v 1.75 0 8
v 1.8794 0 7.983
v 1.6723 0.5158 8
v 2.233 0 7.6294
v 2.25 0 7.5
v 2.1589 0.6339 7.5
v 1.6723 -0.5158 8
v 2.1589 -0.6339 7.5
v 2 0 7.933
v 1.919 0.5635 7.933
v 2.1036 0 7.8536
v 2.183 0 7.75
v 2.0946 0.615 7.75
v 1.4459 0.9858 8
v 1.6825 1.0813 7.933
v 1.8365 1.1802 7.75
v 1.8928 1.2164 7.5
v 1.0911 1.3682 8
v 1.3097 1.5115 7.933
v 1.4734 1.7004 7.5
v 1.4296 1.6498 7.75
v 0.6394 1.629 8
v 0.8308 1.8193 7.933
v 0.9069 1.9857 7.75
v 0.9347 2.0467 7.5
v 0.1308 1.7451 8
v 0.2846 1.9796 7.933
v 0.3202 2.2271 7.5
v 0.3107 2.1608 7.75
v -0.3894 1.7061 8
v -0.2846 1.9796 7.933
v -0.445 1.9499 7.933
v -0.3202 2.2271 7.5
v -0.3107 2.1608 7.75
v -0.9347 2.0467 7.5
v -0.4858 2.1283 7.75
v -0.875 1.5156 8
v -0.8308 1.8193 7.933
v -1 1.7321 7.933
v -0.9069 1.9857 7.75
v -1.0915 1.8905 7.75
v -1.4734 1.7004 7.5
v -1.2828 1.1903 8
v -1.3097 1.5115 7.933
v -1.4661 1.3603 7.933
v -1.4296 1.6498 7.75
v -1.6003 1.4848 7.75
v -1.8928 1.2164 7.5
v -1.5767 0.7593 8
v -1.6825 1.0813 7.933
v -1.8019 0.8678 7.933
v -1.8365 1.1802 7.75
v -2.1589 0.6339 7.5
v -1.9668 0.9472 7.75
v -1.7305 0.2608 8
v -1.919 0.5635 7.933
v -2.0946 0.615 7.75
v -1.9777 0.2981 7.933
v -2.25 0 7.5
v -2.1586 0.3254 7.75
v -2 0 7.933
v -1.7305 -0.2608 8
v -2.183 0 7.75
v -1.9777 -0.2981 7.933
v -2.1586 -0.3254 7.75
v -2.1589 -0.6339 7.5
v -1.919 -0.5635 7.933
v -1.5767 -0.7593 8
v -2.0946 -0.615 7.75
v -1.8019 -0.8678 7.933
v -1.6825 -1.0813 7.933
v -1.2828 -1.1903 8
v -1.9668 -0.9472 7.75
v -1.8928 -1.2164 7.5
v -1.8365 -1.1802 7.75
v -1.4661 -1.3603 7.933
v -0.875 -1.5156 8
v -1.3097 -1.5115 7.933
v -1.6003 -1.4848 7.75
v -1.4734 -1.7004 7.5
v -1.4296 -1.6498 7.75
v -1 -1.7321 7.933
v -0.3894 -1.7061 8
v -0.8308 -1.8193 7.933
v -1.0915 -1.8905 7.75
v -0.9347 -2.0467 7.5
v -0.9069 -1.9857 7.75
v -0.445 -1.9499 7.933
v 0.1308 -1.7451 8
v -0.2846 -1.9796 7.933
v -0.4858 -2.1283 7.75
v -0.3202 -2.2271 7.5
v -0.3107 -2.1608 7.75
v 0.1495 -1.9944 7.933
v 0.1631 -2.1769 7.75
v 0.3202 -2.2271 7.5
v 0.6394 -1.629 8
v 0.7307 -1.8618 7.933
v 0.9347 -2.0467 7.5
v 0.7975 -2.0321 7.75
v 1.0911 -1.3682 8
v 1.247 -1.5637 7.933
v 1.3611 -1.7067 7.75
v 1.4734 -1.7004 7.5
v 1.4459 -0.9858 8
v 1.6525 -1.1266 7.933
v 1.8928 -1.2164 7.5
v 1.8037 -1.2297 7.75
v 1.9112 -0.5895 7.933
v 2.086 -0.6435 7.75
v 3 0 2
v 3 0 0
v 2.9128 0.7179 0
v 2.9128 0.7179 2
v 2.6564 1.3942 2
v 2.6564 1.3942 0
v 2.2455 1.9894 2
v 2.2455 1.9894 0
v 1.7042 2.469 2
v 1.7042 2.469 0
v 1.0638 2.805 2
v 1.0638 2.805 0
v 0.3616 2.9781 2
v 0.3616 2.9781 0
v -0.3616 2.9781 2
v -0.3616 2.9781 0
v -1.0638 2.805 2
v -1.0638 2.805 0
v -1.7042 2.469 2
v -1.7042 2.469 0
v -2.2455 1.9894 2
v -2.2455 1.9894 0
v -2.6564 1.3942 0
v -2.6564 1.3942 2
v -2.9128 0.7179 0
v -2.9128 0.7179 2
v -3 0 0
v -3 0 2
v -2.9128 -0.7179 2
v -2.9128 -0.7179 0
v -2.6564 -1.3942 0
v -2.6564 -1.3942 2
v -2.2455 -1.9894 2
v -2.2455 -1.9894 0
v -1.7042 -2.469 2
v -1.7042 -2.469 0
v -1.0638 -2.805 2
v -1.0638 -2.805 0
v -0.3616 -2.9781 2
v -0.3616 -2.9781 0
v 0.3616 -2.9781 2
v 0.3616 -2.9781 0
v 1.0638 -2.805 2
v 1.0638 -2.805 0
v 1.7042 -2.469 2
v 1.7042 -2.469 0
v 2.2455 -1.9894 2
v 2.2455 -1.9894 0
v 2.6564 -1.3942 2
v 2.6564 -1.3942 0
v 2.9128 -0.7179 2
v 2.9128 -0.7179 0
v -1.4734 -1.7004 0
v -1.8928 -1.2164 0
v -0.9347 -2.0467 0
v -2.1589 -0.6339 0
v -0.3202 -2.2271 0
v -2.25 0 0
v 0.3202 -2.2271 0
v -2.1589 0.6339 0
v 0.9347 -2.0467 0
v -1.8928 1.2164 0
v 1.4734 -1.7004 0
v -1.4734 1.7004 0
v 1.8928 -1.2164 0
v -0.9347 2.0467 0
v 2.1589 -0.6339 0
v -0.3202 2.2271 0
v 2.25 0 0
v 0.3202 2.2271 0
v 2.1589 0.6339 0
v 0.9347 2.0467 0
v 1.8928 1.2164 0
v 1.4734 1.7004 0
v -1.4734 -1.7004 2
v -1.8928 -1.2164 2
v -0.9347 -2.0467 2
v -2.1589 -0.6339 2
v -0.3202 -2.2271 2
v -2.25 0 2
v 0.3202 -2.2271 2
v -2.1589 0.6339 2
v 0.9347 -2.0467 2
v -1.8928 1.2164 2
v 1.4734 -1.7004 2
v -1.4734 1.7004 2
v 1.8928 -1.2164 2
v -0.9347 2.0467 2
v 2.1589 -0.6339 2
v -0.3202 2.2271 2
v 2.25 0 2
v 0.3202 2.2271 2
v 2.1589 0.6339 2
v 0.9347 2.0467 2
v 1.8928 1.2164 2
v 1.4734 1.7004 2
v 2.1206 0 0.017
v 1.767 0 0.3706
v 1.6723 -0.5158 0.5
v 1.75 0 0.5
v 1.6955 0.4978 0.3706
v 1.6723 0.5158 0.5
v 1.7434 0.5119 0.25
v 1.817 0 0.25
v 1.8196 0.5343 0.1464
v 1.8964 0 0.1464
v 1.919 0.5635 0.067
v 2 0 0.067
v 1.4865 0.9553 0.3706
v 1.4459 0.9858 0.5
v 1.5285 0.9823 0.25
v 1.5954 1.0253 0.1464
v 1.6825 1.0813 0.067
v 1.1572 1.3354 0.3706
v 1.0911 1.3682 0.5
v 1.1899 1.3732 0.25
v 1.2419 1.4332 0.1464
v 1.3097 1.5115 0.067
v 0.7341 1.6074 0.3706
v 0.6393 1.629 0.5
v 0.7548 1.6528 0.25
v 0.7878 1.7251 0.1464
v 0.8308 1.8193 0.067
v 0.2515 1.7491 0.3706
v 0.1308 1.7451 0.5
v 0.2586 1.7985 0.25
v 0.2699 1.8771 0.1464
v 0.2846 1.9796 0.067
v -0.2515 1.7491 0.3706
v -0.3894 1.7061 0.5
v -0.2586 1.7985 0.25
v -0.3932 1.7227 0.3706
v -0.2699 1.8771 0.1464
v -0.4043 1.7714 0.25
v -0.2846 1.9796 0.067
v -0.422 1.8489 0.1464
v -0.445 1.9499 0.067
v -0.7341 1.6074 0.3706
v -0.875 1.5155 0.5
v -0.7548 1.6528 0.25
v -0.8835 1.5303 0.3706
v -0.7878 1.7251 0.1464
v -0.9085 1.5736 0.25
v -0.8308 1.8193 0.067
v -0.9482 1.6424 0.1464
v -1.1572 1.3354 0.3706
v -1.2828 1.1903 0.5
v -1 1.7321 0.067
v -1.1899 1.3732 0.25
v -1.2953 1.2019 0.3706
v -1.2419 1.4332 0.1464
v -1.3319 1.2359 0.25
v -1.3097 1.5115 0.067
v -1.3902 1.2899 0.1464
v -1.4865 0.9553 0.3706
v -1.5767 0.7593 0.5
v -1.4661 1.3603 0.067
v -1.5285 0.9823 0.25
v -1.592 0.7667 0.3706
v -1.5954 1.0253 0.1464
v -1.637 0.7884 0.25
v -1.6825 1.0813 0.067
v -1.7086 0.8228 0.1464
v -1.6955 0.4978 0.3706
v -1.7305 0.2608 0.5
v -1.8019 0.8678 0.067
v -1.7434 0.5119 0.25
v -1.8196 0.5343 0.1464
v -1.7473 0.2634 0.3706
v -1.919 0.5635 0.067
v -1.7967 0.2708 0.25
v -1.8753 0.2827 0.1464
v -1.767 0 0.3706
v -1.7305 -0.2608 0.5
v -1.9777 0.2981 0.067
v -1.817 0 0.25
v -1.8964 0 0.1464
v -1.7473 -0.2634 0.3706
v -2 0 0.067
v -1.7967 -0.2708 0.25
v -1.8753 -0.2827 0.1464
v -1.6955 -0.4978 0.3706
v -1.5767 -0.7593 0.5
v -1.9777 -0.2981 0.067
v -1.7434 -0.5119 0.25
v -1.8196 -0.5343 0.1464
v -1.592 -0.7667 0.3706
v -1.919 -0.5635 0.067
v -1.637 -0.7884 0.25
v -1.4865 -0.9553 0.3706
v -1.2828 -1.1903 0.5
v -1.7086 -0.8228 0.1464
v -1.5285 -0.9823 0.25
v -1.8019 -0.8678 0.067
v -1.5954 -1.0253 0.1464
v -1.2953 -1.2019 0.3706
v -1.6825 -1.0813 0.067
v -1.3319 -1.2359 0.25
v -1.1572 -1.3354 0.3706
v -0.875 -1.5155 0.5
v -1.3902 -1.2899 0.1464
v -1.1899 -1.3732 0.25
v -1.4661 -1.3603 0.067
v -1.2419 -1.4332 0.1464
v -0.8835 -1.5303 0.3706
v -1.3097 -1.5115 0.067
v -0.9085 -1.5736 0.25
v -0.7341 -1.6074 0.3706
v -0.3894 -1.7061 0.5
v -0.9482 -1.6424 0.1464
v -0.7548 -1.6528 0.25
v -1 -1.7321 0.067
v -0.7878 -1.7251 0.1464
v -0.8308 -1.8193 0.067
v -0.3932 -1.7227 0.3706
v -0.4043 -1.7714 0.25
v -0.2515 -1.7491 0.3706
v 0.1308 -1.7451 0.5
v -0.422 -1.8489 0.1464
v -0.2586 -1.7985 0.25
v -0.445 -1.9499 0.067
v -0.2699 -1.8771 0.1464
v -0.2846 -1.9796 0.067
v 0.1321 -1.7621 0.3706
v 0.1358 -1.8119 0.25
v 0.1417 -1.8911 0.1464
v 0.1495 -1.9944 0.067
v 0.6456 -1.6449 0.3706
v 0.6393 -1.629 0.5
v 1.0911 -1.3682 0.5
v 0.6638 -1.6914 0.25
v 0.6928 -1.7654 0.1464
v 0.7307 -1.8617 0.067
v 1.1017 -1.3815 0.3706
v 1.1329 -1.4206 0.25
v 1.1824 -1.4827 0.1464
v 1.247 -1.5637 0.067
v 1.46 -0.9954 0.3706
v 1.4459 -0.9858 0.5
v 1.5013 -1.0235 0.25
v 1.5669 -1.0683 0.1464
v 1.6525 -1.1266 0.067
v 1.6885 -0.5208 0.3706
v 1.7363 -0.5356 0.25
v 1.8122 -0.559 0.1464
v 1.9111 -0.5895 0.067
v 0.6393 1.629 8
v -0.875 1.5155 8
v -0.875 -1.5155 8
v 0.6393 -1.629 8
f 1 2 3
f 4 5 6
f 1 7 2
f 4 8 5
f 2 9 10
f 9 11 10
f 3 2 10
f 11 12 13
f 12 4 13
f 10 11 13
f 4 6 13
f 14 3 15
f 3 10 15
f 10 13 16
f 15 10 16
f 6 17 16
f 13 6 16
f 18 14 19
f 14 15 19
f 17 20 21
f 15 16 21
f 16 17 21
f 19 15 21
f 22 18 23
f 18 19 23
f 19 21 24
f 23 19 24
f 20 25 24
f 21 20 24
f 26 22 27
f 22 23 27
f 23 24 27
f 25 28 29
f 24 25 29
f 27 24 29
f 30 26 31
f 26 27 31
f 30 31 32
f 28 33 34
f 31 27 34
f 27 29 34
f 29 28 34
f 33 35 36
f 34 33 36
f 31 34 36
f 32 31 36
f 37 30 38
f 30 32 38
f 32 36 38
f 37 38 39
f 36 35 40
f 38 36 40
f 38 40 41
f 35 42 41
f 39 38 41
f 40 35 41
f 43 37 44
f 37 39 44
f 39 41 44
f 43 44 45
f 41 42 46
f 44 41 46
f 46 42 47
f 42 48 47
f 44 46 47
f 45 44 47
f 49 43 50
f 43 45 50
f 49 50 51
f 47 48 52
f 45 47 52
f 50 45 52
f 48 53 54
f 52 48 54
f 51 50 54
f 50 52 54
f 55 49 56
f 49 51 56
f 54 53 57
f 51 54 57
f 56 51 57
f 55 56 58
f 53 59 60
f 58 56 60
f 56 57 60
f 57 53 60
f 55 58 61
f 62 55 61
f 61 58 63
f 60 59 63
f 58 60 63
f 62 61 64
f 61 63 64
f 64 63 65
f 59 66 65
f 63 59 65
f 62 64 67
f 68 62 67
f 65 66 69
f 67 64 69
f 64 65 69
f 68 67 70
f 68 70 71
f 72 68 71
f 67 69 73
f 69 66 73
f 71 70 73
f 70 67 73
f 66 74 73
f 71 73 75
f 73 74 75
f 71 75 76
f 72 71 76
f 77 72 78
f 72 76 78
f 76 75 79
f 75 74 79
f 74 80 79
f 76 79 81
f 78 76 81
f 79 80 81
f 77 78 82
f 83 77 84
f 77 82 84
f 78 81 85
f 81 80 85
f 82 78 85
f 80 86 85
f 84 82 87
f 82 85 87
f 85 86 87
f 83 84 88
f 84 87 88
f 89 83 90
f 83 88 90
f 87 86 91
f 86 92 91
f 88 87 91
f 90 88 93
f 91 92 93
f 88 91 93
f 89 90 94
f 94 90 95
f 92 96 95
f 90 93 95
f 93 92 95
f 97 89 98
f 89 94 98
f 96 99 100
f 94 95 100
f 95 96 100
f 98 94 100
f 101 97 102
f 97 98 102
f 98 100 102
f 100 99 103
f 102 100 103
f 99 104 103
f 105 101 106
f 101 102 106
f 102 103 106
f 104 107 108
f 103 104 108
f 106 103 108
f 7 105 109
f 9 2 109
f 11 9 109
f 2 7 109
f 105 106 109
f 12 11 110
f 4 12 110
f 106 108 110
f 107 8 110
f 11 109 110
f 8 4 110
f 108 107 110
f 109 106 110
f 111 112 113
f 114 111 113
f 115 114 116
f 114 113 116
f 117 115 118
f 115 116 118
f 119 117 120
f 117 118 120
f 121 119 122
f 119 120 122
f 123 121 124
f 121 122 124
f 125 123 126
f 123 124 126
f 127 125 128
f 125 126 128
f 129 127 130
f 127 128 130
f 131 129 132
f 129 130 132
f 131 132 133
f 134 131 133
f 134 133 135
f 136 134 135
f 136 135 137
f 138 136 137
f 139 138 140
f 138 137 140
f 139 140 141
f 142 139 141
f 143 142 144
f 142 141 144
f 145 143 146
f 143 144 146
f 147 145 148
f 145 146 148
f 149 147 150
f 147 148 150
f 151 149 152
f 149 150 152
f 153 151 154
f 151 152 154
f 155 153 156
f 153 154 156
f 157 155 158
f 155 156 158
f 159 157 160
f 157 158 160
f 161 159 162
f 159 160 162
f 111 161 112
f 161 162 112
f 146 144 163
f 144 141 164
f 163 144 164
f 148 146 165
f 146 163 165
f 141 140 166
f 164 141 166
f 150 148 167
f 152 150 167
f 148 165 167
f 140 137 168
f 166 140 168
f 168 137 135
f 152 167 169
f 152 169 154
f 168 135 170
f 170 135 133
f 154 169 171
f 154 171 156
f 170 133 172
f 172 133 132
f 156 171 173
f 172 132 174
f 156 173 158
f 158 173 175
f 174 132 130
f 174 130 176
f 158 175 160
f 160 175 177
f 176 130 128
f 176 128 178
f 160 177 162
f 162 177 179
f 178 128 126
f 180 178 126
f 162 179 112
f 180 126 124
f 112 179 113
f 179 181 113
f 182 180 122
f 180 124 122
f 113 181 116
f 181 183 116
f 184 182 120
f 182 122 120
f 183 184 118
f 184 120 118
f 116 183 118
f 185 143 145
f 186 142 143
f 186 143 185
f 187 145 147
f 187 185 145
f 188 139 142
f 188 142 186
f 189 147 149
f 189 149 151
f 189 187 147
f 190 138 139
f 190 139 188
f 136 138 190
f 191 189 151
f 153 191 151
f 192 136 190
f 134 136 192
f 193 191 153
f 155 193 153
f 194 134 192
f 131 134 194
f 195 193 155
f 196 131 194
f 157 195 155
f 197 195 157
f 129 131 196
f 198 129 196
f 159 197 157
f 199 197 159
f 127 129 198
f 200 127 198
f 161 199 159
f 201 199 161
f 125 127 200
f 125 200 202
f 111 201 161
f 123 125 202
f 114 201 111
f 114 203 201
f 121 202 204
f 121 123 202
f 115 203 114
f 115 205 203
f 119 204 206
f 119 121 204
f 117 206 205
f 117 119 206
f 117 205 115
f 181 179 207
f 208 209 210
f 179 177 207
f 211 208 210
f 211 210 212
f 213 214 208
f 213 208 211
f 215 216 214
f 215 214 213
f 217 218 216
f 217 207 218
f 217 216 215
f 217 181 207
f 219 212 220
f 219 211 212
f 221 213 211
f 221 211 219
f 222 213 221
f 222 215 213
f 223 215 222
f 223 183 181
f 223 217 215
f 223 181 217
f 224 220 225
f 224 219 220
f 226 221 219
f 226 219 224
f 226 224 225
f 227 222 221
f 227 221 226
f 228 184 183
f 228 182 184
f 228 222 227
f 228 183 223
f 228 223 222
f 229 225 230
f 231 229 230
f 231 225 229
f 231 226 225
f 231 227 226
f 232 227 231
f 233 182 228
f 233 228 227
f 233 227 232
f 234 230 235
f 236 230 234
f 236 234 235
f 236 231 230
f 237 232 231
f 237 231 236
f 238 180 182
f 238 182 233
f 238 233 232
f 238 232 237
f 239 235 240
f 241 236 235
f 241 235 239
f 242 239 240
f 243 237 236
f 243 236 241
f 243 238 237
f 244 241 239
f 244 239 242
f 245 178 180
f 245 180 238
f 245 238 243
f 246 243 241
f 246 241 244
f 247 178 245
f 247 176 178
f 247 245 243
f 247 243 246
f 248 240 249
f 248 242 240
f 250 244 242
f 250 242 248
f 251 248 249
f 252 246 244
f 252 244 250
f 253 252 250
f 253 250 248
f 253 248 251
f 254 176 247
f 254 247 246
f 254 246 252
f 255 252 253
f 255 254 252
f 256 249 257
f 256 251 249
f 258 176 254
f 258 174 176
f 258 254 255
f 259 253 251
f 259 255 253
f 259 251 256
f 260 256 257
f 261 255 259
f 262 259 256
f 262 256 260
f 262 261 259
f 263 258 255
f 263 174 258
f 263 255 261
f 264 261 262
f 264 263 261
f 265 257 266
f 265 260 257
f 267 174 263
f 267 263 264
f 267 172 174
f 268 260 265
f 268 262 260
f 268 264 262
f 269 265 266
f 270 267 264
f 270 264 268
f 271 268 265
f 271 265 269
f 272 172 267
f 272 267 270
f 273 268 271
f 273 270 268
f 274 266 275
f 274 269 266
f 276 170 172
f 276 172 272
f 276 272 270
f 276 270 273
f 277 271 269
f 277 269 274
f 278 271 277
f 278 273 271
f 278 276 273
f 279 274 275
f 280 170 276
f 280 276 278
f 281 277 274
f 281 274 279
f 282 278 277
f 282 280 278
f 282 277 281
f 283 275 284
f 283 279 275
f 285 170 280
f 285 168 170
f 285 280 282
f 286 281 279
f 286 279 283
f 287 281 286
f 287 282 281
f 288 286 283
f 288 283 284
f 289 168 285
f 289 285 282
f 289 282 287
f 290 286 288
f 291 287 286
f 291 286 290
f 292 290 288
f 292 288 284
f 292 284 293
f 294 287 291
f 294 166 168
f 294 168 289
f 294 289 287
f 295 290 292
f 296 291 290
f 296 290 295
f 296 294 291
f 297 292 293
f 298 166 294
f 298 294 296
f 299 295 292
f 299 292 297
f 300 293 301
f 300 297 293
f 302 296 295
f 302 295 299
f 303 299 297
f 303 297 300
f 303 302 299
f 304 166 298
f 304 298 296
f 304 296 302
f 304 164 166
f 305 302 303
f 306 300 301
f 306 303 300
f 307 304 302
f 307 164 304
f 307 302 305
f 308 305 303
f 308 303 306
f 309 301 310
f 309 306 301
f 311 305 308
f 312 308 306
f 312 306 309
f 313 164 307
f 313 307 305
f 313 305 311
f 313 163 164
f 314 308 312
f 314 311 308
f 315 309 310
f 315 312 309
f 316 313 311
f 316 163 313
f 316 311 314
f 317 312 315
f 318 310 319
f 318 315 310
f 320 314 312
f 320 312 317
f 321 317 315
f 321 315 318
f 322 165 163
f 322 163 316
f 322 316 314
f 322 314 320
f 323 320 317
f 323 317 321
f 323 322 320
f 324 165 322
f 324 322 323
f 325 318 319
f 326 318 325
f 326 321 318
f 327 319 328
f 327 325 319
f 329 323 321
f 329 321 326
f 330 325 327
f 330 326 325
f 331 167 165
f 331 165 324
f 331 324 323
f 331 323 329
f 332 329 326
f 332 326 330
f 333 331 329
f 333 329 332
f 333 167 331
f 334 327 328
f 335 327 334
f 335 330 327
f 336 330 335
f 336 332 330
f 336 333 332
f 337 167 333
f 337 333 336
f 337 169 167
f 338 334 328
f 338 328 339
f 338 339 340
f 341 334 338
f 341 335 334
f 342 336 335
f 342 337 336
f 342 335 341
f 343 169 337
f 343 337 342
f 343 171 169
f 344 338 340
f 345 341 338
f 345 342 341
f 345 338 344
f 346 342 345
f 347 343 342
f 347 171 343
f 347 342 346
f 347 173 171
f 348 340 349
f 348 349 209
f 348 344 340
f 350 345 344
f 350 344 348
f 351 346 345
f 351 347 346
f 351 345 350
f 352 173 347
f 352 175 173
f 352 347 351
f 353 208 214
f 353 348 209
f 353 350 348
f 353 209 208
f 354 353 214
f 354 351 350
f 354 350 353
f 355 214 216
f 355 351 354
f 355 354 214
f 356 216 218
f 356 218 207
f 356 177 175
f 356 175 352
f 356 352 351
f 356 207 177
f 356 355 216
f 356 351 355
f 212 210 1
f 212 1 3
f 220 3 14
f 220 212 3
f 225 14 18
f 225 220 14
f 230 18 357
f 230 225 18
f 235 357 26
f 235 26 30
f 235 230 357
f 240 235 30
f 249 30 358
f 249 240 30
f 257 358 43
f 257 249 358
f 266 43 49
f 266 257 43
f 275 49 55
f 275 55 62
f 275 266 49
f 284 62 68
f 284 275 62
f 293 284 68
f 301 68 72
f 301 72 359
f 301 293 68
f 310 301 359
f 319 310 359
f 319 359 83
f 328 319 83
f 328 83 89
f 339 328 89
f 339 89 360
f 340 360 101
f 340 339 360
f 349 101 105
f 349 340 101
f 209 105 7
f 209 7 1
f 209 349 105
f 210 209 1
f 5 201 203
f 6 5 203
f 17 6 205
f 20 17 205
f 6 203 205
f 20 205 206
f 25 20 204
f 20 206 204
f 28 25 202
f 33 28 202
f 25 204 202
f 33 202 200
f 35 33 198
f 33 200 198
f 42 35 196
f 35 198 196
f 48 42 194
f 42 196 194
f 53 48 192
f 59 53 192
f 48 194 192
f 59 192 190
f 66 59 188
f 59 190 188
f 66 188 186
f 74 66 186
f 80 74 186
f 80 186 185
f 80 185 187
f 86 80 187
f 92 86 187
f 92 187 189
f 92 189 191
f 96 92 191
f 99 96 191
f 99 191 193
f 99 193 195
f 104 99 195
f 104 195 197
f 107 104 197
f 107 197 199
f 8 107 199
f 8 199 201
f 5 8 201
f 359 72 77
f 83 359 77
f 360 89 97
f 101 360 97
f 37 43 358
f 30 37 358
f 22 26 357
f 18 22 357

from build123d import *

# Parameters (mm, degrees)
F0_R     = 3
F0_R_2   = 2.25
F1_DEPTH = 2
F0_R_3   = 1.75
F2_DEPTH = 8
F3_R     = 0.5
F4_R     = 0.49999


# Not quite as in the source:
# - a fillet or chamfer is up to 0.001 mm smaller than in the source, because OpenCascade refuses the exact size


with BuildPart() as f1:
    # F0 (on Top) → F1 (new body)
    with BuildSketch(Plane.XY):
        Circle(F0_R)
        Circle(F0_R_2, mode=Mode.SUBTRACT)
    extrude(amount=F1_DEPTH)

    # F0 (on Top) → F2 (join)
    with BuildSketch(Plane.XY):
        Circle(F0_R_2)
        Circle(F0_R_3, mode=Mode.SUBTRACT)
    extrude(amount=F2_DEPTH)

    # F3
    f3_edges = [f1.edges().sort_by_distance(p)[0] for p in [
        (-1.75, 0, 0),
    ]]
    fillet(f3_edges, radius=F3_R)

    # F4 (radius 0.5 in the source; OpenCascade refuses exactly that, so slightly less here)
    f4_edges = [f1.edges().sort_by_distance(p)[0] for p in [
        (-2.25, 0, 8),
    ]]
    fillet(f4_edges, radius=F4_R)


solid = f1.part
